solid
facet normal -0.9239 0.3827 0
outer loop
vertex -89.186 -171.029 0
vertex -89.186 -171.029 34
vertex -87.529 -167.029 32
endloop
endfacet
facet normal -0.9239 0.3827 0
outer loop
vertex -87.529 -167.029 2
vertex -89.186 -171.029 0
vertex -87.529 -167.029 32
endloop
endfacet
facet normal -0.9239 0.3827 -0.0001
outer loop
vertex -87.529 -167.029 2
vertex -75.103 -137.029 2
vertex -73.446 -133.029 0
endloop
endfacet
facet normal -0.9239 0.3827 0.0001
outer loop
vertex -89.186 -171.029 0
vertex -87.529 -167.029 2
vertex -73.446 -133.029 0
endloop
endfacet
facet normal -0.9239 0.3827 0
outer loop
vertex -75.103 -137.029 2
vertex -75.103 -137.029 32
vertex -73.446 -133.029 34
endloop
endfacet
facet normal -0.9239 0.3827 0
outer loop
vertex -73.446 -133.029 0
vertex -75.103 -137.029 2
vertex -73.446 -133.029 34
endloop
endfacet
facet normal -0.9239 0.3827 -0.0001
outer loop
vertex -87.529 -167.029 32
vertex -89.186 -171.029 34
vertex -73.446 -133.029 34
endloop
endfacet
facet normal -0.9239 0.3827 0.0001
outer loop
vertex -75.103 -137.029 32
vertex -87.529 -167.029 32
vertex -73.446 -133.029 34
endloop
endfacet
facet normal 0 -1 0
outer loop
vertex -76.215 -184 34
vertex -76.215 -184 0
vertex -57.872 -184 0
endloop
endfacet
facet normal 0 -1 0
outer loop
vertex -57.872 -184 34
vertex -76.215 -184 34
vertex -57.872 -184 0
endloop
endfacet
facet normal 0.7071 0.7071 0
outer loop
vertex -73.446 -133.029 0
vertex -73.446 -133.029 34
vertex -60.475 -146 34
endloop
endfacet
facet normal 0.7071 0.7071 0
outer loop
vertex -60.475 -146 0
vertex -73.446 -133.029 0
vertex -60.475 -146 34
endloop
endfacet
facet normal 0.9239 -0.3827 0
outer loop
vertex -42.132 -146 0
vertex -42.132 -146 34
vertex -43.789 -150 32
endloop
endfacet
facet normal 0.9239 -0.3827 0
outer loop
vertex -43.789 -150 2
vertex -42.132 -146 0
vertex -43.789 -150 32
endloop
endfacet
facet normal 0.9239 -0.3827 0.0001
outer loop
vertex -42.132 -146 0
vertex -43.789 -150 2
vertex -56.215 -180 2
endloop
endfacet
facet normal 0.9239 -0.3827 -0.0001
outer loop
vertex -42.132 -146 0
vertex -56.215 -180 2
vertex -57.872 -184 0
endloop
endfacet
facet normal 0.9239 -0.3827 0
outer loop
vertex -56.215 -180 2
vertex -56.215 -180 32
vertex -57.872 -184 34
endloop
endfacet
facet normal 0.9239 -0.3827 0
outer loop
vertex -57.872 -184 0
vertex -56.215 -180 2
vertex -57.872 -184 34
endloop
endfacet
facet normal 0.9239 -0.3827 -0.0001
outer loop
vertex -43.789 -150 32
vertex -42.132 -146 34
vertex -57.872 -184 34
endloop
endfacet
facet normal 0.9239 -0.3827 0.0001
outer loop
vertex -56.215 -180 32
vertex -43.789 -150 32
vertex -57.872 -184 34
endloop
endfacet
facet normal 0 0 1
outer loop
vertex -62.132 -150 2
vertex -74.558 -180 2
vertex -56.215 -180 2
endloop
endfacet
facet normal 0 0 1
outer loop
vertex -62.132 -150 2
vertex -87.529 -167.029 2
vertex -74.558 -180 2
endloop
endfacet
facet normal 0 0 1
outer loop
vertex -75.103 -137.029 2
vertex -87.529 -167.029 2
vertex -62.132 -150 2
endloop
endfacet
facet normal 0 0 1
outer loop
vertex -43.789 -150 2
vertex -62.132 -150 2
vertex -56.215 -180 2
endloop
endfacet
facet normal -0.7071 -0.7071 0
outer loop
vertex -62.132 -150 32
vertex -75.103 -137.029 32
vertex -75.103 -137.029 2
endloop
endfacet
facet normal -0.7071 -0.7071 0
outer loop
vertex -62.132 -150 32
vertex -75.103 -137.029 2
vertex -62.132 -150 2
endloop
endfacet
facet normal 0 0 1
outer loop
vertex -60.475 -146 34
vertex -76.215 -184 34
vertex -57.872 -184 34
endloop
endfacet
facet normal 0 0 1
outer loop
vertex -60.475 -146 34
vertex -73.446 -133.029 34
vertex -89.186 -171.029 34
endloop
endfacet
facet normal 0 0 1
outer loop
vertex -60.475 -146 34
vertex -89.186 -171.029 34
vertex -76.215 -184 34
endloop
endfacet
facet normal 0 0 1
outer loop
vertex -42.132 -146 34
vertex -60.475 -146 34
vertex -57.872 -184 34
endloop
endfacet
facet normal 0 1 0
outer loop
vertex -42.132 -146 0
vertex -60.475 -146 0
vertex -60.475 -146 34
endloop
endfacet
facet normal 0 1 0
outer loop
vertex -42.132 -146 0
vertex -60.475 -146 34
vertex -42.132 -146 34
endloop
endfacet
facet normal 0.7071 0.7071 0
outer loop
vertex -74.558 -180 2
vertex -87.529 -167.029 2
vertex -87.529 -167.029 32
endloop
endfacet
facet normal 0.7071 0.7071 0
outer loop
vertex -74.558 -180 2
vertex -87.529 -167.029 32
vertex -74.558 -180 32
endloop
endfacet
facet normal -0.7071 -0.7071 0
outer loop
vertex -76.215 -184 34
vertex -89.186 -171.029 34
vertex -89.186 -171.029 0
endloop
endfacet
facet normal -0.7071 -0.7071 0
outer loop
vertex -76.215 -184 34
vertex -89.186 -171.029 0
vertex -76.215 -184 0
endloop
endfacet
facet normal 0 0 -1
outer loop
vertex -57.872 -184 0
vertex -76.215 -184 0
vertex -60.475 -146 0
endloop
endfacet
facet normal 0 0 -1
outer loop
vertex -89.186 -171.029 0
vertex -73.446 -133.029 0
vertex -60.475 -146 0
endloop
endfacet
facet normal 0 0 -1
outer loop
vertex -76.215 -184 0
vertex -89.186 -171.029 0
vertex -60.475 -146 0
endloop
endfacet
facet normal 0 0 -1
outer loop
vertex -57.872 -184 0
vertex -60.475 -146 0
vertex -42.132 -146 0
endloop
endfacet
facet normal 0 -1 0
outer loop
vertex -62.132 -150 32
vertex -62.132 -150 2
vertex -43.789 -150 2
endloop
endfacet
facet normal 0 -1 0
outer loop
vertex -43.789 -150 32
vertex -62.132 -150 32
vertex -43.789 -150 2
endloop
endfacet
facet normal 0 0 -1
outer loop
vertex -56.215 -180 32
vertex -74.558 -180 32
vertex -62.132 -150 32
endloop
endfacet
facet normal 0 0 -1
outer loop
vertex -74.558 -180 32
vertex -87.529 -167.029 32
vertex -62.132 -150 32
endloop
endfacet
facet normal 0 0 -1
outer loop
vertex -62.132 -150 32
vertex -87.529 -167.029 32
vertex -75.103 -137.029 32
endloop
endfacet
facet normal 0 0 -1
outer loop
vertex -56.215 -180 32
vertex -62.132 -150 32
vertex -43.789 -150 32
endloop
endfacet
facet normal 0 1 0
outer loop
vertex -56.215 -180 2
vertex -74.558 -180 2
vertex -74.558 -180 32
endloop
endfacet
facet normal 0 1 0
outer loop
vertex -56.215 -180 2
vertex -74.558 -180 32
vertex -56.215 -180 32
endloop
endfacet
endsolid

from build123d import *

# Parameters (mm, degrees)
RESSALTO_EXTRUS_O1_DEPTH   = 34
RESSALTO_EXTRUS_O1_2_DEPTH = 34
RESSALTO_EXTRUS_O2_DEPTH   = 2
RESSALTO_EXTRUS_O3_START   = 34
RESSALTO_EXTRUS_O3_DEPTH   = 2
CORTE_EXTRUS_O2_DEPTH      = 42


with BuildPart() as part:
    # Esboço1 → Ressalto-extrusão1 (new body)
    with BuildSketch(Plane.XY):
        Polygon((76.215295477, -184), (184, -76.215295477), (184, 76.215295477), (76.215295477, 184), (-76.215295477, 184), (-184, 76.215295477), (-184, -76.215295477), (-76.215295477, -184), align=None)
        Polygon((180, -74.558441227), (180, 74.558441227), (74.558441227, 180), (-74.558441227, 180), (-180, 74.558441227), (-180, -74.558441227), (-74.558441227, -180), (74.558441227, -180), align=None, mode=Mode.SUBTRACT)
    extrude(amount=RESSALTO_EXTRUS_O1_DEPTH)



with BuildPart() as body_2:
    # Esboço1 → Ressalto-extrus_o1 2 (new body)
    with BuildSketch(Plane.XY):
        Polygon((62.132034356, -150), (150, -62.132034356), (150, 62.132034356), (62.132034356, 150), (-62.132034356, 150), (-150, 62.132034356), (-150, -62.132034356), (-62.132034356, -150), align=None)
        Polygon((146, -60.475180106), (146, 60.475180106), (60.475180106, 146), (-60.475180106, 146), (-146, 60.475180106), (-146, -60.475180106), (-60.475180106, -146), (60.475180106, -146), align=None, mode=Mode.SUBTRACT)
    extrude(amount=RESSALTO_EXTRUS_O1_2_DEPTH)


with BuildPart() as part_1:
    add(part.part)

    add(body_2.part)  # Ressalto-extrusão2 merges body 2
    # Esboço1<3> → Ressalto-extrusão2 (add)
    with BuildSketch(Plane.XY):
        Polygon((74.558441227, -180), (180, -74.558441227), (180, 74.558441227), (74.558441227, 180), (-74.558441227, 180), (-180, 74.558441227), (-180, -74.558441227), (-74.558441227, -180), align=None)
        Polygon((150, -62.132034356), (150, 62.132034356), (62.132034356, 150), (-62.132034356, 150), (-150, 62.132034356), (-150, -62.132034356), (-62.132034356, -150), (62.132034356, -150), align=None, mode=Mode.SUBTRACT)
    extrude(amount=RESSALTO_EXTRUS_O2_DEPTH)

    # Esboço1<4> → Ressalto-extrusão3 (add)
    with BuildSketch(Plane.XY.offset(RESSALTO_EXTRUS_O3_START)):
        Polygon((74.558441227, -180), (180, -74.558441227), (180, 74.558441227), (74.558441227, 180), (-74.558441227, 180), (-180, 74.558441227), (-180, -74.558441227), (-74.558441227, -180), align=None)
        Polygon((150, -62.132034356), (150, 62.132034356), (62.132034356, 150), (-62.132034356, 150), (-150, 62.132034356), (-150, -62.132034356), (-62.132034356, -150), (62.132034356, -150), align=None, mode=Mode.SUBTRACT)
    extrude(amount=-RESSALTO_EXTRUS_O3_DEPTH)

    # Esboço5 → Corte-extrusão2 (cut)
    with BuildSketch(Plane.XY.offset(34)):
        Polygon((-42.132034356, -146), (-57.872149726, -184), (76.215295477, -184), (184, -76.215295477), (184, 76.215295477), (76.215295477, 184), (-76.215295477, 184), (-184, 76.215295477), (-184, -76.215295477), (-89.185858225, -171.029437252), (-73.445742855, -133.029437252), (-146, -60.475180106), (-146, 60.475180106), (-60.475180106, 146), (60.475180106, 146), (146, 60.475180106), (146, -60.475180106), (60.475180106, -146), align=None)
    extrude(amount=-CORTE_EXTRUS_O2_DEPTH, mode=Mode.SUBTRACT)


solid = part_1.part
